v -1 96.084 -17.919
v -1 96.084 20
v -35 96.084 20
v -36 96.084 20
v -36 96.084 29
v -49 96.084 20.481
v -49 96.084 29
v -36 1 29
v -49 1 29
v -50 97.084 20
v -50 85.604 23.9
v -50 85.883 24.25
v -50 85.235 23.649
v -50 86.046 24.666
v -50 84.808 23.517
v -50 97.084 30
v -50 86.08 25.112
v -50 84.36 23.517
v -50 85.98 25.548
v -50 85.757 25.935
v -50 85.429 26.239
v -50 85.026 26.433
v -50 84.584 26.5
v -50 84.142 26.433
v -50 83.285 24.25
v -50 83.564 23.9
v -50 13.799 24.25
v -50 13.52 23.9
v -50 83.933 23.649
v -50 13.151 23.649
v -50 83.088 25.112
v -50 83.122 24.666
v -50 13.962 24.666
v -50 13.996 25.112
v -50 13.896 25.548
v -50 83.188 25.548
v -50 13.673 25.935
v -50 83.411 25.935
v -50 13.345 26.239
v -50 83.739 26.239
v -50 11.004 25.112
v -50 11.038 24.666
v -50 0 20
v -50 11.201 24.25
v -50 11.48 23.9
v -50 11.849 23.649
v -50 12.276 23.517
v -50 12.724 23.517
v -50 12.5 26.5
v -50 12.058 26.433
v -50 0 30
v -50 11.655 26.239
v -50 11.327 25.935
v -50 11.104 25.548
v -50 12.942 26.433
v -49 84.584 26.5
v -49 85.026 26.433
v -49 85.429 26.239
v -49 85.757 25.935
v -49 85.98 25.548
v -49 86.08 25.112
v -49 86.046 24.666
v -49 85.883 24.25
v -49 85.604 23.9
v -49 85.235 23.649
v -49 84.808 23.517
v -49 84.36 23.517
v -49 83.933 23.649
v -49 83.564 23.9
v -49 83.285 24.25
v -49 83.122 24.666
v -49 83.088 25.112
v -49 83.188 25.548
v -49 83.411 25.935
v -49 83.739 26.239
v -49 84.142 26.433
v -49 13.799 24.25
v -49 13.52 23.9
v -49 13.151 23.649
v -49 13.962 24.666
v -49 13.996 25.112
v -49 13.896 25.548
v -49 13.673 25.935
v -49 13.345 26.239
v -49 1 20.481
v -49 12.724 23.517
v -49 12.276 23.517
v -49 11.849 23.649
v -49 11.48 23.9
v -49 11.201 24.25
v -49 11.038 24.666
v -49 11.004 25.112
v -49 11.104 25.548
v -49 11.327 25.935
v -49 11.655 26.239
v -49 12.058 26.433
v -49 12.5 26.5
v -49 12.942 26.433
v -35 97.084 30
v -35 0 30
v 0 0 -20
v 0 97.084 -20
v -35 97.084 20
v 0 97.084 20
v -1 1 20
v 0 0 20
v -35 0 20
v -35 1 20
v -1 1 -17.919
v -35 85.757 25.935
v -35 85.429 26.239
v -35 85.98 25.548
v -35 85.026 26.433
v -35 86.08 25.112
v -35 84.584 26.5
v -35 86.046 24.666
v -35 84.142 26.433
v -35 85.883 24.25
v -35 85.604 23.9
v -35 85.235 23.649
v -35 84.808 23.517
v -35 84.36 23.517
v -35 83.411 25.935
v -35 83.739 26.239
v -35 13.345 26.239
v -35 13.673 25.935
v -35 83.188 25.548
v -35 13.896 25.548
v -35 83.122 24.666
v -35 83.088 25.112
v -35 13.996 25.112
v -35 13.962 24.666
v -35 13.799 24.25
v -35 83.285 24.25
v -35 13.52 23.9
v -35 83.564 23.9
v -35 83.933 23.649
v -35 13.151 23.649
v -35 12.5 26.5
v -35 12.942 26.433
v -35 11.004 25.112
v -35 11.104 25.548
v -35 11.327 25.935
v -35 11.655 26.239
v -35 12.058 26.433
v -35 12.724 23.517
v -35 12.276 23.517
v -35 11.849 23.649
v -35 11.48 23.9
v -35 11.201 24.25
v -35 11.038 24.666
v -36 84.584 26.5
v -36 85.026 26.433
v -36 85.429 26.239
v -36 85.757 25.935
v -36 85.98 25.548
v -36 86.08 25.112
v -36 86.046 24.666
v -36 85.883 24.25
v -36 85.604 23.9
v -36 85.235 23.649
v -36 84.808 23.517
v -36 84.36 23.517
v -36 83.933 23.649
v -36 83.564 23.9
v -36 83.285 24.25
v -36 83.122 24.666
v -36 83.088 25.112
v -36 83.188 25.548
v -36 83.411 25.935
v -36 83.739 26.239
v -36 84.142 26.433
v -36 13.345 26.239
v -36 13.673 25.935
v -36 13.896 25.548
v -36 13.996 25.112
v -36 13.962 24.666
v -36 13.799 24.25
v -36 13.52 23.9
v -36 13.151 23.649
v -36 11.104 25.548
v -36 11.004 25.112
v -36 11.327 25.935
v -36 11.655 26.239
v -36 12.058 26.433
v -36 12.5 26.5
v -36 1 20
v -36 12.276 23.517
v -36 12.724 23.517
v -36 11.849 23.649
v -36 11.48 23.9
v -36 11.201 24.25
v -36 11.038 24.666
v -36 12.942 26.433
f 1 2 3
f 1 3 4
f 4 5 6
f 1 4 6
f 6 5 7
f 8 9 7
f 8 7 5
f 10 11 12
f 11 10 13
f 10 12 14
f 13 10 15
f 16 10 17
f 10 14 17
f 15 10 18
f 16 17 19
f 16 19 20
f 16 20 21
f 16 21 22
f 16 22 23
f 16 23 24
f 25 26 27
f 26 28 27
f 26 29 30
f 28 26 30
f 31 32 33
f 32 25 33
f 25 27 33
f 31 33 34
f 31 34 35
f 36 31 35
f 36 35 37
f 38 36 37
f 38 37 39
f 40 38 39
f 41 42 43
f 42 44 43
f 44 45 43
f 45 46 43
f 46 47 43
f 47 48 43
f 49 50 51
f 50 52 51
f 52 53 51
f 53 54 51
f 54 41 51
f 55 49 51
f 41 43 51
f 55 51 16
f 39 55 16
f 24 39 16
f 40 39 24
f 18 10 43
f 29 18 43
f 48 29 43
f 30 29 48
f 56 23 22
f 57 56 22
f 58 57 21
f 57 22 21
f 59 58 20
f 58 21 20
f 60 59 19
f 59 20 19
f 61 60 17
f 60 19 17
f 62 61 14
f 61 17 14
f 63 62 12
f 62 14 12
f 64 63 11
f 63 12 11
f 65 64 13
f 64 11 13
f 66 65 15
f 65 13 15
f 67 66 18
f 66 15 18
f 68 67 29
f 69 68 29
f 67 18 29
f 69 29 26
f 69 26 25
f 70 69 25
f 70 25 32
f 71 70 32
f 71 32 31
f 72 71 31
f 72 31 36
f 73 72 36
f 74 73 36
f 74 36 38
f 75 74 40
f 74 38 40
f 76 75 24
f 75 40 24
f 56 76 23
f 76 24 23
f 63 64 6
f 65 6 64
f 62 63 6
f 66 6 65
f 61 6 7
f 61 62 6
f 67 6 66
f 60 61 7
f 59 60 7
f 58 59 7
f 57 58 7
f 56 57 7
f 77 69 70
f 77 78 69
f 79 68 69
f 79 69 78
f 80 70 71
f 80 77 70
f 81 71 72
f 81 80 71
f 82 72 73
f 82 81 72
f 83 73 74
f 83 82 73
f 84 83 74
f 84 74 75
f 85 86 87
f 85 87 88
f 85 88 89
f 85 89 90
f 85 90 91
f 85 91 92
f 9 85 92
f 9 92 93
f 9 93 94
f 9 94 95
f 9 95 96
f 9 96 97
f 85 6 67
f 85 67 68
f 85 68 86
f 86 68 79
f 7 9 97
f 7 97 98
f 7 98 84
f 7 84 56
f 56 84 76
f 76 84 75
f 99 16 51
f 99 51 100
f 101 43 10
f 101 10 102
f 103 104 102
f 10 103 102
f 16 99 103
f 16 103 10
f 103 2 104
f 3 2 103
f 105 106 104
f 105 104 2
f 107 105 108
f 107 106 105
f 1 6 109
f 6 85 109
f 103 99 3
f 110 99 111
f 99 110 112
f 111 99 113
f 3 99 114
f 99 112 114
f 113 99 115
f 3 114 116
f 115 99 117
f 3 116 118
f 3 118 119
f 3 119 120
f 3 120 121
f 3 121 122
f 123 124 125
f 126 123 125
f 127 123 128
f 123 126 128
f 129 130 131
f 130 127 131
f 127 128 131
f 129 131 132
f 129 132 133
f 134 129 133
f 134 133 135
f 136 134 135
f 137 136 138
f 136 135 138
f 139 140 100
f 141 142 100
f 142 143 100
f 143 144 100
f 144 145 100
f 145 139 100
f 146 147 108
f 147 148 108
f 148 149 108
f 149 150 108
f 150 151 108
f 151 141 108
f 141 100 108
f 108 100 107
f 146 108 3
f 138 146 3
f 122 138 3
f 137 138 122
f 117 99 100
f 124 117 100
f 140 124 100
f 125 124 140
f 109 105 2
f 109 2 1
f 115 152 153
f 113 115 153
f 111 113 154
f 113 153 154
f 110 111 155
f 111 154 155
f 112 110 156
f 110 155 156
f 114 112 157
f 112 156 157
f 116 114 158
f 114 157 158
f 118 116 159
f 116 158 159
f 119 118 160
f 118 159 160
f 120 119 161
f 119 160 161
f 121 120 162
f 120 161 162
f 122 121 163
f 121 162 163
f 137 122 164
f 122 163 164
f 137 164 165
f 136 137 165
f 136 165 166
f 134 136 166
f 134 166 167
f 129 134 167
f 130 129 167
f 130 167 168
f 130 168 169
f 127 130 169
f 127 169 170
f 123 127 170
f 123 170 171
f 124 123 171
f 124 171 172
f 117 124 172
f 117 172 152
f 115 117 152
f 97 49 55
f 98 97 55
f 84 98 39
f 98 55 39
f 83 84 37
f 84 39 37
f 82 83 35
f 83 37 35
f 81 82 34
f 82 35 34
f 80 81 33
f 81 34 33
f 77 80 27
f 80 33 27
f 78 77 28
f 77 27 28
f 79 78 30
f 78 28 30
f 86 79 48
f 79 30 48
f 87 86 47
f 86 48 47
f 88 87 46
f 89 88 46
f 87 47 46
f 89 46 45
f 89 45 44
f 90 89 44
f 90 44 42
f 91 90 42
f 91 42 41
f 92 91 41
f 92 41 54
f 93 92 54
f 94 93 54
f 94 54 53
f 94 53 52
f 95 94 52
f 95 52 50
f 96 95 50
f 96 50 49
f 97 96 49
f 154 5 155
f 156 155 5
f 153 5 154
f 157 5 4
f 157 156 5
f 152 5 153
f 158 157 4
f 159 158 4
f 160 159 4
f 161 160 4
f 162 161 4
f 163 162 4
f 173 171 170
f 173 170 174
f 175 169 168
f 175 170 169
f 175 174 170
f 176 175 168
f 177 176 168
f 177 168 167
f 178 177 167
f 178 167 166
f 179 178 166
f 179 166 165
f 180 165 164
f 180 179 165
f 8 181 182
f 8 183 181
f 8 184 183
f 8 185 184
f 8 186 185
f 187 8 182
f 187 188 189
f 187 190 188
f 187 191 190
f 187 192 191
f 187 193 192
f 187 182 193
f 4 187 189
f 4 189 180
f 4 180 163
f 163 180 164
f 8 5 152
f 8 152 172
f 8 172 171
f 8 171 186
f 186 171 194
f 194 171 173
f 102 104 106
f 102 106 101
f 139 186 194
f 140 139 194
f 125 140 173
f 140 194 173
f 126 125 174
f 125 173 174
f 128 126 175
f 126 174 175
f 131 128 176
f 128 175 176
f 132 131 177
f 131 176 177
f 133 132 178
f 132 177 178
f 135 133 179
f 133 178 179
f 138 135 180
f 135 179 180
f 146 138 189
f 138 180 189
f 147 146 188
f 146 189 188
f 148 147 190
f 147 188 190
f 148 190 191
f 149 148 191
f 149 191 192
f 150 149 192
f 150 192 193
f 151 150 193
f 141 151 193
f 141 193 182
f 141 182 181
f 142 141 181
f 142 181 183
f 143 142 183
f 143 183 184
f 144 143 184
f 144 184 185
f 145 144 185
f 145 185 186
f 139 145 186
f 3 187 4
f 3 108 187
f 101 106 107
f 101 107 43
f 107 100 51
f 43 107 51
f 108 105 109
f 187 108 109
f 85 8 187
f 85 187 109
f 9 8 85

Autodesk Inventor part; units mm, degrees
ref_plane "YZ Plane" through (0, 0, 0) normal (1, 0, 0) x (0, 1, 0)
ref_plane "XZ Plane" through (0, 0, 0) normal (0, 1, 0) x (-1, 0, 0)
ref_plane "XY Plane" through (0, 0, 0) normal (0, 0, 1) x (1, 0, 0)
sketch "Esboço1" plane through (0, 0, 0) normal (0, 1, 0) x (-1, 0, 0)
  line L0 (0, 20) -> (0, -20)
  line L1 (0, 20) -> (50, 20)
  line L2 (50, 20) -> (0, -20)
  line L3 (50, 20) -> (50, 30)
  line L4 (50, 30) -> (35, 30)
  line L5 (35, 30) -> (35, 20)
  point P0 (0, 0)
  dimension "d0" = 40
  dimension "d1" = 50
  dimension "d2" = 10
  dimension "d3" = 15
extrude "Extrusão1" add sketch "Esboço1" along normal blind 97.084
shell "Casca1" thickness 1 removed faces 1 at (-23.3333, 32.3613, 20)
sketch "Esboço2" plane through (-50, 0, 20) normal (-1, 0, 0) x (0, 0, 1)
  line L0 (10, 97.084) -> (0, 97.084) projected
  line L1 (0, 97.084) -> (5, 97.084)
  line L2 (5, 97.084) -> (5, 84.584)
  circle A0 centre (5, 84.584) radius 1.5
  line L3 (10, 0) -> (0, 0) projected
  line L4 (0, 0) -> (5, 0)
  line L5 (5, 0) -> (5, 12.5)
  circle A1 centre (5, 12.5) radius 1.5
  point P0 (-20, 0)
  dimension "d7" = 5
  dimension "d8" = 12.5
  dimension "d9" = 3
  dimension "d10" = 5
  dimension "d11" = 12.5
  dimension "d12" = 3
extrude "Extrusão2" cut sketch "Esboço2" against normal blind 102.84
thread "Rosca1" size "M3x0.5" class "6H" standard "ANSI Metric M Profile" length 20
thread "Rosca2" size "M3x0.5" class "6H" standard "ANSI Metric M Profile" length 20
thread "Rosca3" size "M3x0.5" class "6H" standard "ANSI Metric M Profile" length 20
thread "Rosca4" size "M3x0.5" class "6H" standard "ANSI Metric M Profile" length 20
sketch "Esboço3" plane through (0, 97.084, 0) normal (0, 1, 0) x (1, 0, 0)
  line L0 (-50, -30) -> (-35, -30) projected
  point P0 (0, 0)
  point P1 (-35, -20)
  dimension "d23" = 10
sketch "Esboço4" plane through (-50, 0, 20) normal (-1, 0, 0) x (0, 0, 1)
  line L0 (0, 97.084) -> (10, 97.084) projected
  line L1 (0, 0) -> (10, 0) projected
  point P0 (-20, 0)
  dimension "d24" = 97.084
sketch "Esboço5" plane through (0, 97.084, 0) normal (0, 1, 0) x (1, 0, 0)
  point P0 (0, 0)
properties part number "Rampa 1"
